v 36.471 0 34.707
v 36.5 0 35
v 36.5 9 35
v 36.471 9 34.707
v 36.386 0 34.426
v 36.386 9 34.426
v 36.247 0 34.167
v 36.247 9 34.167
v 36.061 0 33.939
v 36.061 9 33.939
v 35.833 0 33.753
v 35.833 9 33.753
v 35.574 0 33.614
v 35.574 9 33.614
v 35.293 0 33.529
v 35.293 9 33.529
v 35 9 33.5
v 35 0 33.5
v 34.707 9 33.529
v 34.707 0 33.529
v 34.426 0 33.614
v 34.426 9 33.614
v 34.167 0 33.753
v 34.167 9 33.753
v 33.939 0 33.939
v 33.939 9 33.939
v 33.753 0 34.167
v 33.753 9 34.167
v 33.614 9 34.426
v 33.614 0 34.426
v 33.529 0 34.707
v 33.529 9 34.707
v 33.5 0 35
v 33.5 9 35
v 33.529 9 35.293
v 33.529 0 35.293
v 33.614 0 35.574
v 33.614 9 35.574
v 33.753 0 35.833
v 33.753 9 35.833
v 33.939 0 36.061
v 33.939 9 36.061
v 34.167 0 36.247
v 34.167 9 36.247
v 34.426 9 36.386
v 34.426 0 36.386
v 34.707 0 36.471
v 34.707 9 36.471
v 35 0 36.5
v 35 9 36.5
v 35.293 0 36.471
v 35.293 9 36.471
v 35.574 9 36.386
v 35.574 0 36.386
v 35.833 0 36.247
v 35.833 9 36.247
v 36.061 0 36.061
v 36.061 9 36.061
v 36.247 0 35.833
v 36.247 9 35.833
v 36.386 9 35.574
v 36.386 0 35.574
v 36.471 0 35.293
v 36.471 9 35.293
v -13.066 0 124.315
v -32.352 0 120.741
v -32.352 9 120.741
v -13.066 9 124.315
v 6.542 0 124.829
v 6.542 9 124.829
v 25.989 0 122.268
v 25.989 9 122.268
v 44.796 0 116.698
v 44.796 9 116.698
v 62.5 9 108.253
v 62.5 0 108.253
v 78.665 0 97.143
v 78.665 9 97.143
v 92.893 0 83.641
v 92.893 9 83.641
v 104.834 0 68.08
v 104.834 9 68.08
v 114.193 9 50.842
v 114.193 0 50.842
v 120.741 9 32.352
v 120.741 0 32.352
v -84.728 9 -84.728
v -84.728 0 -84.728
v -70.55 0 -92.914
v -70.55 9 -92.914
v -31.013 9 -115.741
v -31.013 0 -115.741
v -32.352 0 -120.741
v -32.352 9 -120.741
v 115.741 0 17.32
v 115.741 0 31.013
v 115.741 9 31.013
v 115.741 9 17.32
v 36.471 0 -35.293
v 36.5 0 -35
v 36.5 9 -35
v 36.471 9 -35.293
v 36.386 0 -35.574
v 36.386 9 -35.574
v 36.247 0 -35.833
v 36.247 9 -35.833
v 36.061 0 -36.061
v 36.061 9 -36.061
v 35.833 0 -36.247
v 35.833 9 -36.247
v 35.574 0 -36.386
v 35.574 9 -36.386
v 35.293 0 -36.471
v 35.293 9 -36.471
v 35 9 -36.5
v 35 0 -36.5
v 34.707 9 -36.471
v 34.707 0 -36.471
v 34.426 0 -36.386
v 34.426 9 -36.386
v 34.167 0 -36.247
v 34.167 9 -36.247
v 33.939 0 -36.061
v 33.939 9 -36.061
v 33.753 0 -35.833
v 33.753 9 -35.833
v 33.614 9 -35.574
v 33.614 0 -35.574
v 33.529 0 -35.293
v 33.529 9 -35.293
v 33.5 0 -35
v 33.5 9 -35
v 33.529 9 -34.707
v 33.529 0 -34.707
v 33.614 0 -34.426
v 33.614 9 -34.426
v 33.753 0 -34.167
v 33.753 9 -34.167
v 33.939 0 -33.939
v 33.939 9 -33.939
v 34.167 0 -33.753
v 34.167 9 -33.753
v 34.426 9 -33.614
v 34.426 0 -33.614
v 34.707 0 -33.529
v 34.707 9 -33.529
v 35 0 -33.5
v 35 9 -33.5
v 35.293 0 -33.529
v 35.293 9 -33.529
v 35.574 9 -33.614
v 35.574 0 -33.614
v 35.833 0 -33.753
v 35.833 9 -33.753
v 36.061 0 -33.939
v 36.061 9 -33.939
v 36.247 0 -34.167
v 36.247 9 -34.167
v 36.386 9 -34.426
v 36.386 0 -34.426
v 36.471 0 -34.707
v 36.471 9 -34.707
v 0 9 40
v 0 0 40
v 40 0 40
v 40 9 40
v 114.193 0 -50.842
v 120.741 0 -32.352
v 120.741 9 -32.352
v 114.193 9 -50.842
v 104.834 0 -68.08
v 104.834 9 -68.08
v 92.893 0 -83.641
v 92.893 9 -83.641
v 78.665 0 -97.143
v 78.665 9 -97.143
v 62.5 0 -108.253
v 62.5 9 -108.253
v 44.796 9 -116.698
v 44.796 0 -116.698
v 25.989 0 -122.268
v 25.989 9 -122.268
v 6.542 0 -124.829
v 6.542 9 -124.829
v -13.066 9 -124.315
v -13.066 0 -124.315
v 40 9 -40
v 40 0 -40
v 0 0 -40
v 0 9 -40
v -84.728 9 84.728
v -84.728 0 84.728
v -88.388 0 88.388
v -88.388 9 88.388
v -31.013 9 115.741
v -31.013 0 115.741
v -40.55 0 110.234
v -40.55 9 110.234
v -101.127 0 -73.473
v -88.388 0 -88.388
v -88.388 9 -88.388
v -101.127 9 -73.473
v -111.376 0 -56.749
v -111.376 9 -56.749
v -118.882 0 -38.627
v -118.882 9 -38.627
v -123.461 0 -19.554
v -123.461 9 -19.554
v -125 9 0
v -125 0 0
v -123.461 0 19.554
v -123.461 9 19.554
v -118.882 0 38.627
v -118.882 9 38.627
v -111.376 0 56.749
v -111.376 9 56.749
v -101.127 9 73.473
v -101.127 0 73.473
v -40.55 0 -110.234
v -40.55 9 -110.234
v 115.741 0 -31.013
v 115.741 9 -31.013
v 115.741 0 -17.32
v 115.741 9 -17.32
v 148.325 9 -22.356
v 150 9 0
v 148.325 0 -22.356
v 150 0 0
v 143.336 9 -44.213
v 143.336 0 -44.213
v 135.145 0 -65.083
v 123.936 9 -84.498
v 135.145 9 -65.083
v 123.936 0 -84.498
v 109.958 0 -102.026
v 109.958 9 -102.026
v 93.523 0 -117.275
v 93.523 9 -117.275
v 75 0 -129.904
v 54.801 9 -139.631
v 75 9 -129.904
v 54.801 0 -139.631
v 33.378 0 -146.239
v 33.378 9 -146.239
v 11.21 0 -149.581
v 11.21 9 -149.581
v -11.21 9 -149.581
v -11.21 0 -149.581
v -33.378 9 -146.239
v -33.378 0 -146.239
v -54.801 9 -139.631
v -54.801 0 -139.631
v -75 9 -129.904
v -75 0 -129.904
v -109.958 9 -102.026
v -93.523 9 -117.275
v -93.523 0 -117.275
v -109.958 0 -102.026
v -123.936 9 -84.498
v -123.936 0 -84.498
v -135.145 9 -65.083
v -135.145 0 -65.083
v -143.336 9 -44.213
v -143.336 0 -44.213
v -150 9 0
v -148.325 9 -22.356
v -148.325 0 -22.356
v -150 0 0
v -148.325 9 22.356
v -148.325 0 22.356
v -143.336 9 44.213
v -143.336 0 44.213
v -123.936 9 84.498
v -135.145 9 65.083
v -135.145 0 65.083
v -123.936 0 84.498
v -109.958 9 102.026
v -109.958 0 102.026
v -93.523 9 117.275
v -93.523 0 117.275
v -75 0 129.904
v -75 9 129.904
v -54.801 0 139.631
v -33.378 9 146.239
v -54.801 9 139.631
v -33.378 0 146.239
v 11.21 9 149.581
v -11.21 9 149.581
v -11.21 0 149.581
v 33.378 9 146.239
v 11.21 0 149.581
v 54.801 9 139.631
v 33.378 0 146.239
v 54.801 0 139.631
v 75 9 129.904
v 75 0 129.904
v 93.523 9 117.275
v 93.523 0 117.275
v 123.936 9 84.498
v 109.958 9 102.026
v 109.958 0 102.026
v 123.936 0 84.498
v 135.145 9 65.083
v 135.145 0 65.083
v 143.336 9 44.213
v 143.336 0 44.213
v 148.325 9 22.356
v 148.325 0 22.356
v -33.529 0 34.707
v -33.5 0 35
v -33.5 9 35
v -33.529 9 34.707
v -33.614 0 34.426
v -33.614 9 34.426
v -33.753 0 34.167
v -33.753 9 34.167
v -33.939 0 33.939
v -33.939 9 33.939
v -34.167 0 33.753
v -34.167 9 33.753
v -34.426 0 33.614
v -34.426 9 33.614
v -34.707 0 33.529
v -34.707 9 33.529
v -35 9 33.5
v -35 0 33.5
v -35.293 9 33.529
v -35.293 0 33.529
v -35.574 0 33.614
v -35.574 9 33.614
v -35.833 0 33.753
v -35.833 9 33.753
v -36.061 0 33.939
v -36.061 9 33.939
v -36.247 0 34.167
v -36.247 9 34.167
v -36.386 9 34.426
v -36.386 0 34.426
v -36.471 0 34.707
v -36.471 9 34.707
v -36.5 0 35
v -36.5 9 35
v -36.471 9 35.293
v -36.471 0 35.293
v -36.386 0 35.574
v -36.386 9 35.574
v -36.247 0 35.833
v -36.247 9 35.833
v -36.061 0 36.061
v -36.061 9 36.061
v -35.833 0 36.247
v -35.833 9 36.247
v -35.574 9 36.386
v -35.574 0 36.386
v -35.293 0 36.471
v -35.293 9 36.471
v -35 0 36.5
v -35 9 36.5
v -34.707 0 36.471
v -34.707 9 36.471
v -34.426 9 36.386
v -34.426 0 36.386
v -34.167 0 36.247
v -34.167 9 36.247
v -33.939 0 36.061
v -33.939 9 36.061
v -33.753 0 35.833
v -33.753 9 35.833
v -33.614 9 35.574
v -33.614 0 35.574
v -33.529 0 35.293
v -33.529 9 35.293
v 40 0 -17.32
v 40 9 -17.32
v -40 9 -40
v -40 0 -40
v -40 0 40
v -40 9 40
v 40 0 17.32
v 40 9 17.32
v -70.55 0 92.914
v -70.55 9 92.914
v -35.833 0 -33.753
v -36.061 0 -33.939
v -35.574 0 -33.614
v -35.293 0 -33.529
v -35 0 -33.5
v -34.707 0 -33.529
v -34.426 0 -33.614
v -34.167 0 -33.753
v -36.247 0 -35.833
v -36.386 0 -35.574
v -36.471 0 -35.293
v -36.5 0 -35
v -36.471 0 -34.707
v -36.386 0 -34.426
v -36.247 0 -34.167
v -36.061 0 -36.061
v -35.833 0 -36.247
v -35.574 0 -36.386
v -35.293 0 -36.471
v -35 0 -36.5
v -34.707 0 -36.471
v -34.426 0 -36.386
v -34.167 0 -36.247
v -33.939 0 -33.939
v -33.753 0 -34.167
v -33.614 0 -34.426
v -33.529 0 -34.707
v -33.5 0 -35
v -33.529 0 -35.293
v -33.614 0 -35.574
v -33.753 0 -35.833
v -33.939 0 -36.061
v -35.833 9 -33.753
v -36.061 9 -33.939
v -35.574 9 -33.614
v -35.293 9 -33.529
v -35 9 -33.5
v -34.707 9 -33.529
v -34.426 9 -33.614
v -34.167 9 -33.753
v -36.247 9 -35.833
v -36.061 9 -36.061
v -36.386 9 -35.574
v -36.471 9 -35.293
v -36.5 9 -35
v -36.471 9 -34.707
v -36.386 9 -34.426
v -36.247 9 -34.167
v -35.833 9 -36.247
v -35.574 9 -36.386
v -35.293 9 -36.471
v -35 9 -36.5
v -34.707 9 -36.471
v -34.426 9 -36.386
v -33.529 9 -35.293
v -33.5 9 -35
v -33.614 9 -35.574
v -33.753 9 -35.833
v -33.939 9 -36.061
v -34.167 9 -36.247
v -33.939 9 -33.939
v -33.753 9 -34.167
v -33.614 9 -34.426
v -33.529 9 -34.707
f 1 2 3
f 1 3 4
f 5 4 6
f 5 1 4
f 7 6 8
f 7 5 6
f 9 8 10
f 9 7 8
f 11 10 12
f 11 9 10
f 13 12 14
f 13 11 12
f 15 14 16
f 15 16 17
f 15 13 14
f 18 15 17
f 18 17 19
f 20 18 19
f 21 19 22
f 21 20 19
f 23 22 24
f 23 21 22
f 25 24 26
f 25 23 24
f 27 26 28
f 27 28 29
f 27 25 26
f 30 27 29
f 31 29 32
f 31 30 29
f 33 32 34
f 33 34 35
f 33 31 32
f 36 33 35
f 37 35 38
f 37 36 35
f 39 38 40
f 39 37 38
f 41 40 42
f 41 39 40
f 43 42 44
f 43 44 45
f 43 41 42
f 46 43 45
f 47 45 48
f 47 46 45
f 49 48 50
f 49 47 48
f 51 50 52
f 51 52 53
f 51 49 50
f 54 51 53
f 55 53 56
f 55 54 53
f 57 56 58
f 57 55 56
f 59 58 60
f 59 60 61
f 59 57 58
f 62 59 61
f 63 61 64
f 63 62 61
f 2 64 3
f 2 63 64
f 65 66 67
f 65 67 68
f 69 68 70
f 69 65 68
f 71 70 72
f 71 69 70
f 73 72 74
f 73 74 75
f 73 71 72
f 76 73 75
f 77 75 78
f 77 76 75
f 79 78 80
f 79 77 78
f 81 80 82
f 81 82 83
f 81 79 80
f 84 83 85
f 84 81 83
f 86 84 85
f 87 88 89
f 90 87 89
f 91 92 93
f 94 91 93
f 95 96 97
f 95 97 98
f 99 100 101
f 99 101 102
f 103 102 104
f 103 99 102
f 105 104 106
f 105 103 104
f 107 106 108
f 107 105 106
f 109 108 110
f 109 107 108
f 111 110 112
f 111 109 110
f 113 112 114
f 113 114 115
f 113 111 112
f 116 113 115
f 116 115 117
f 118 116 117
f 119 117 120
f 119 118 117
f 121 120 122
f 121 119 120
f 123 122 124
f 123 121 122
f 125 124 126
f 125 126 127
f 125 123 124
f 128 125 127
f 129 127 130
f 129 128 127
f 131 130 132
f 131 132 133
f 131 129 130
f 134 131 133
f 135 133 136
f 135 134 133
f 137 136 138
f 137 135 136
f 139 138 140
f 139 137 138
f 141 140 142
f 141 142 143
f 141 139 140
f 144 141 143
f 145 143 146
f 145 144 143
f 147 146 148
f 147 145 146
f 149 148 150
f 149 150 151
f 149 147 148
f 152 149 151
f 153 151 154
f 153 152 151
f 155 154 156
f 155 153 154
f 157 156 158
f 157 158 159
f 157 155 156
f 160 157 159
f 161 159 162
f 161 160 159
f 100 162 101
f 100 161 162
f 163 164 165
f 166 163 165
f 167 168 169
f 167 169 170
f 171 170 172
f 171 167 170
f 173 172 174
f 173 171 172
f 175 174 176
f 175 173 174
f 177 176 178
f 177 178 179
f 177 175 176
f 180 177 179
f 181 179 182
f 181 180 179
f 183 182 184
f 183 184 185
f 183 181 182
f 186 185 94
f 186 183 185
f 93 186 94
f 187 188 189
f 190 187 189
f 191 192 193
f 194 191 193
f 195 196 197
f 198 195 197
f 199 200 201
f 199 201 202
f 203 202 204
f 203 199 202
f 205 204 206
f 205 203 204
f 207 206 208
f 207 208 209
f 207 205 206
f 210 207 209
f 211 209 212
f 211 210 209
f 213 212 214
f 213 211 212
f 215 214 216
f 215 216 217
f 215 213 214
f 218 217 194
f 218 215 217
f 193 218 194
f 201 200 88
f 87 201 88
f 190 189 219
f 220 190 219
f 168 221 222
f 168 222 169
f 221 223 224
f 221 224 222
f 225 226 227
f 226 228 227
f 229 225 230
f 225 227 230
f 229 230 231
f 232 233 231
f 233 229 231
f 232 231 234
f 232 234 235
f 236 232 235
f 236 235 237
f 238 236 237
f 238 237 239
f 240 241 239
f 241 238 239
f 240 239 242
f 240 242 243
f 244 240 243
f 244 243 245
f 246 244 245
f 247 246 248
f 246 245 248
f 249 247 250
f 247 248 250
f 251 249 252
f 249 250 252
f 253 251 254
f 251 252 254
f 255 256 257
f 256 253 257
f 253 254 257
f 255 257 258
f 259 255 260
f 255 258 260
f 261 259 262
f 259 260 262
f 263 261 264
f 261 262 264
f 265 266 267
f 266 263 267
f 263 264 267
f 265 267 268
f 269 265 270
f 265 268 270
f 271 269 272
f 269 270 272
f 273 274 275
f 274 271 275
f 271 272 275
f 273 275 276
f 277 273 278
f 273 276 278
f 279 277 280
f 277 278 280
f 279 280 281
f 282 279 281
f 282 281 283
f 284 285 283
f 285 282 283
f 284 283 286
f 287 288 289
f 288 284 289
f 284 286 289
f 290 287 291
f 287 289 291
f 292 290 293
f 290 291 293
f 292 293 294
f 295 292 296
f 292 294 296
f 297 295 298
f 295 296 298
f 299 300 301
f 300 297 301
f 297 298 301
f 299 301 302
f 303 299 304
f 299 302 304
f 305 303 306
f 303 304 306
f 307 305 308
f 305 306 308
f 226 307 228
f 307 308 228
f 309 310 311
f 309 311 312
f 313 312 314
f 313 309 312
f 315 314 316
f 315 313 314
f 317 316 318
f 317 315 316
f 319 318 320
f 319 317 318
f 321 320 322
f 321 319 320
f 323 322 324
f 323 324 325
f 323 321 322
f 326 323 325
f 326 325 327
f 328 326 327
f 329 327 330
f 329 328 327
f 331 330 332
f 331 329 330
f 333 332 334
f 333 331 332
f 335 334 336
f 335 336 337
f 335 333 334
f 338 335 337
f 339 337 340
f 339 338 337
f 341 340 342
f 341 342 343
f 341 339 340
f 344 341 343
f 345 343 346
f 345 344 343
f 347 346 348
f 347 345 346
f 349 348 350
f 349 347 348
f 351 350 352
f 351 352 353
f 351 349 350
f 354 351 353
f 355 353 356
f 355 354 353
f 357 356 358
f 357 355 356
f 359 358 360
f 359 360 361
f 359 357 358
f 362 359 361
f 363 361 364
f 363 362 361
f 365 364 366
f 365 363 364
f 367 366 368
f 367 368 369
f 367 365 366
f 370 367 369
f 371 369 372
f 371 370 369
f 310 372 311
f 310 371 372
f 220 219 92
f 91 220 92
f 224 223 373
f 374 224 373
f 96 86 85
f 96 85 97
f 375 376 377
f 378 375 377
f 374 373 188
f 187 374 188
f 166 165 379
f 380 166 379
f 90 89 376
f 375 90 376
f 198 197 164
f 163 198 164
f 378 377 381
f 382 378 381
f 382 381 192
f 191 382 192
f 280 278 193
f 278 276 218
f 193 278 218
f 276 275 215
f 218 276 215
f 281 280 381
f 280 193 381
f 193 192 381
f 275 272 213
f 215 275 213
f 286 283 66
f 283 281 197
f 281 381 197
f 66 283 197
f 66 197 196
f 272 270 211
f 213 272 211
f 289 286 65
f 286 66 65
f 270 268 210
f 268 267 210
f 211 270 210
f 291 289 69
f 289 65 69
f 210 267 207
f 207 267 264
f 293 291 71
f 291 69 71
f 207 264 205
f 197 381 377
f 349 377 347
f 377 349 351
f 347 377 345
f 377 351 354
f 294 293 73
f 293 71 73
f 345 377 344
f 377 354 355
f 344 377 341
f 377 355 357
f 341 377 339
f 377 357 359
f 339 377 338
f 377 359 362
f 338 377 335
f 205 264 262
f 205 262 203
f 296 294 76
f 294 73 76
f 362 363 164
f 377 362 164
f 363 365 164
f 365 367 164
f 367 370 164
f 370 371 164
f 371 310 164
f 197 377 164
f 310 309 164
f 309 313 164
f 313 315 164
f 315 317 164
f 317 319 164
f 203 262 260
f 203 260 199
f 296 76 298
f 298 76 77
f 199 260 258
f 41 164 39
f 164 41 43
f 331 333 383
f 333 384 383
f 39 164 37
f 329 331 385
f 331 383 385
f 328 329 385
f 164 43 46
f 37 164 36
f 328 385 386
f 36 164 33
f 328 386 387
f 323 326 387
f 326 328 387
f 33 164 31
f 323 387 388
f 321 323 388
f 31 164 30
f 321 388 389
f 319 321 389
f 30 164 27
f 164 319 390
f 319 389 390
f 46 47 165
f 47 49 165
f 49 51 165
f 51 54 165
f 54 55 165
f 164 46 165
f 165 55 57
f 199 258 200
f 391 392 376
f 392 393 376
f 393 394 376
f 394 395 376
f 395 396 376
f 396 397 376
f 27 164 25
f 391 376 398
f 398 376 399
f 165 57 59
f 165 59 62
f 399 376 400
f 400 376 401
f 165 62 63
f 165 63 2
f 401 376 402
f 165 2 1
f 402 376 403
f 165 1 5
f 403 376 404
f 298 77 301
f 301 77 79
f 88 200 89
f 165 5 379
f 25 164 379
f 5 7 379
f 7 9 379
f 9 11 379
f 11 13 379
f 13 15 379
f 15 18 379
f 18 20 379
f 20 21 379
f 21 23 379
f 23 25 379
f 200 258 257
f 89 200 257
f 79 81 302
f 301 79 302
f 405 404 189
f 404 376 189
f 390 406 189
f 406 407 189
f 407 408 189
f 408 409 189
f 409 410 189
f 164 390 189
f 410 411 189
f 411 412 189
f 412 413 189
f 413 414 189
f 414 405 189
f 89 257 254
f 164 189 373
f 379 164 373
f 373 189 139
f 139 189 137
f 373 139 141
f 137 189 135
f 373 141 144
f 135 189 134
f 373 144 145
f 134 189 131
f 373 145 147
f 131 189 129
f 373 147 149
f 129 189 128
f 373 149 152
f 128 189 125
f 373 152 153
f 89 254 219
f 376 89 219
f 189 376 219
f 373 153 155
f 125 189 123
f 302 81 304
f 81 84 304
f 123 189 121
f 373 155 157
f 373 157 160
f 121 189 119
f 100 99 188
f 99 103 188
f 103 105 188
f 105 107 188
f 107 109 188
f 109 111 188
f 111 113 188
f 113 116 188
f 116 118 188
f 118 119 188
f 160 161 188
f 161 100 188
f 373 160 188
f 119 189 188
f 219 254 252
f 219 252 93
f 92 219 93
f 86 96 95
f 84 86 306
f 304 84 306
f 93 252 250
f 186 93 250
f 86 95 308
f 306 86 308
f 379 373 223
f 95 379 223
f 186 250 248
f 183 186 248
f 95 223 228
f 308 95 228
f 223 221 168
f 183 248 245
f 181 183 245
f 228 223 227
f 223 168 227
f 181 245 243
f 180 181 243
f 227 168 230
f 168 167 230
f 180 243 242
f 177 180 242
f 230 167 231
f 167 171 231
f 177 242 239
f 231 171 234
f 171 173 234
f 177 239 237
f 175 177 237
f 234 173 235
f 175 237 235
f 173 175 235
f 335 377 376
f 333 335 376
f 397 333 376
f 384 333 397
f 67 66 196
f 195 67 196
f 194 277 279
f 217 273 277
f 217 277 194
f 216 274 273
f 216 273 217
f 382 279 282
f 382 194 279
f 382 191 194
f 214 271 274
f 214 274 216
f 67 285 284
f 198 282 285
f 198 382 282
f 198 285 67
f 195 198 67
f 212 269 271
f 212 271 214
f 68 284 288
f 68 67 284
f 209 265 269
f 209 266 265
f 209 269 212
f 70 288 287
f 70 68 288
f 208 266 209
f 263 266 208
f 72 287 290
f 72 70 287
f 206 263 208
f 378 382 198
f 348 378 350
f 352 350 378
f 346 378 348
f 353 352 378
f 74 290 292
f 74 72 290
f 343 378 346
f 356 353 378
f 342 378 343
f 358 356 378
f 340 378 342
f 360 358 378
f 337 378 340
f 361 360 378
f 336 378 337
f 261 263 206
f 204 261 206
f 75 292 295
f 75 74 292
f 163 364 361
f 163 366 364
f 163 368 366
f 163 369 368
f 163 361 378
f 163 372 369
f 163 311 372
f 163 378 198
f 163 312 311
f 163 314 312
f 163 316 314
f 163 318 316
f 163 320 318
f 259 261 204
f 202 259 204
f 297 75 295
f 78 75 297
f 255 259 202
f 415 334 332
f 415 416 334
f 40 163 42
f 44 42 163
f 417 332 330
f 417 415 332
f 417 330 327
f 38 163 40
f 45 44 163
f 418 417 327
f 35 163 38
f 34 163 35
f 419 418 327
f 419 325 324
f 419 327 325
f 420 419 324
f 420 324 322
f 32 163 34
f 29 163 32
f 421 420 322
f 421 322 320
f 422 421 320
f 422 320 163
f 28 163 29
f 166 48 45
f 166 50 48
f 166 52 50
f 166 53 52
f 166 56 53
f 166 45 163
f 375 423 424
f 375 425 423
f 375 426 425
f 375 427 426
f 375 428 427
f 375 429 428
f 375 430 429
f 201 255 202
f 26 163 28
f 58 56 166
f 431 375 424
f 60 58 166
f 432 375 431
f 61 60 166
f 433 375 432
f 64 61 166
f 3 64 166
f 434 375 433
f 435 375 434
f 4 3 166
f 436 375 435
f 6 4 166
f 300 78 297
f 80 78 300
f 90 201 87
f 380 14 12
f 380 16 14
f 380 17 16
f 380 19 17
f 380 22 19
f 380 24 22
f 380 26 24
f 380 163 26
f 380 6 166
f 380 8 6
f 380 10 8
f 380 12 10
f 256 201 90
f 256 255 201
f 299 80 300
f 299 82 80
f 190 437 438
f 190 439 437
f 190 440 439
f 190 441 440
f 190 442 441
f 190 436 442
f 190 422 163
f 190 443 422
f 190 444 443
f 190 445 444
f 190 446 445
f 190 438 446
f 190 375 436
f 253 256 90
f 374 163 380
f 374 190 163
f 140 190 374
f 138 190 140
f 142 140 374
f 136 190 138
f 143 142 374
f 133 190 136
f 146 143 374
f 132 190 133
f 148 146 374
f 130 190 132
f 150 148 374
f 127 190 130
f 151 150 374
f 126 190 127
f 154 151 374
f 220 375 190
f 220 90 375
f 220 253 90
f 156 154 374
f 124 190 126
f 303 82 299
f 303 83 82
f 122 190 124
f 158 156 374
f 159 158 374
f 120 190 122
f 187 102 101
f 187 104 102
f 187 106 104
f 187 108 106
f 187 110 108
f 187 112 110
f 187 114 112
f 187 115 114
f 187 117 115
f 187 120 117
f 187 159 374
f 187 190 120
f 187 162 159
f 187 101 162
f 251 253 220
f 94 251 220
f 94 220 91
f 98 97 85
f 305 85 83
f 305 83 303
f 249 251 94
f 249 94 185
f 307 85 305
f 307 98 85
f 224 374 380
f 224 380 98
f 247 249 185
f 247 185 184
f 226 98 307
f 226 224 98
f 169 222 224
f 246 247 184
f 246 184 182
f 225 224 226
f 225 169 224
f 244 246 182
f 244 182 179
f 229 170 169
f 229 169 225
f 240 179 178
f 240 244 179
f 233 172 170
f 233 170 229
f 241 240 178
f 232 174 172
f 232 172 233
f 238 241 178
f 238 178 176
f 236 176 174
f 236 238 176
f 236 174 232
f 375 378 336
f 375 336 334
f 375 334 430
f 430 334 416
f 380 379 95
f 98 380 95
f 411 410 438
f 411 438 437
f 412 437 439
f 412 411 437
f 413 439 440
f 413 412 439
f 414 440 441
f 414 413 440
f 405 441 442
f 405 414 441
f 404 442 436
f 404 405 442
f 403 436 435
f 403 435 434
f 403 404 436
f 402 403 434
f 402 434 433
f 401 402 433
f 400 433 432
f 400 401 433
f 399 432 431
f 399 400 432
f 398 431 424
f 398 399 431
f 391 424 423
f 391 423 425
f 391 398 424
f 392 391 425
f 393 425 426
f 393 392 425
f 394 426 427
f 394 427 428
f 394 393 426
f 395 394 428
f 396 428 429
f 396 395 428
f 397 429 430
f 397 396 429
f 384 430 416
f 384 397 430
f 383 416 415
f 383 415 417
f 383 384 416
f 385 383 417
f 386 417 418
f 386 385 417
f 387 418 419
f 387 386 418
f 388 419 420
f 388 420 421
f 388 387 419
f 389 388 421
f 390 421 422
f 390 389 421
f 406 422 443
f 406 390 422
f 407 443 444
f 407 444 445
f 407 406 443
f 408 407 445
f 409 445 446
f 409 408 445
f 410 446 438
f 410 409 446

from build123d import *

# Parameters (mm, degrees)
CROQUIS1_R              = 150
CROQUIS1_R_2            = 125
SALIENTE_EXTRUIR1_DEPTH = 9
SALIENTE_EXTRUIR3_DEPTH = 9
CROQUIS3_R              = 1.5
SALIENTE_EXTRUIR4_DEPTH = 9


with BuildPart() as part:
    # Croquis1 → Saliente-Extruir1 (new body)
    with BuildSketch(Plane(origin=(0, 0, 0), x_dir=(1, 0, 0), z_dir=(0, 1, 0))):
        Circle(CROQUIS1_R)
        Circle(CROQUIS1_R_2, mode=Mode.SUBTRACT)
    extrude(amount=SALIENTE_EXTRUIR1_DEPTH)

    # Croquis2 → Saliente-Extruir3 (add)
    with BuildSketch(Plane(origin=(0, 0, 0), x_dir=(1, 0, 0), z_dir=(0, 1, 0))):
        Polygon((120.740728286, 32.352380638), (146.469530849, 32.352380638), (146.469530849, -32.352380638), (120.740728286, -32.352380638), (115.740728286, -31.012634676), (115.740728286, 31.012634676), align=None)
        Polygon((-88.388347648, -88.388347648), (-101.25274893, -110.670144277), (-45.216781919, -143.022524914), (-32.352380638, -120.740728286), (-31.012634676, -115.740728286), (-84.72809361, -84.72809361), align=None)
        Polygon((-32.352380638, 120.740728286), (-45.216781919, 143.022524914), (-101.25274893, 110.670144277), (-88.388347648, 88.388347648), (-84.72809361, 84.72809361), (-31.012634676, 115.740728286), align=None)
    extrude(amount=SALIENTE_EXTRUIR3_DEPTH)

    # Croquis3 → Saliente-Extruir4 (add)
    with BuildSketch(Plane(origin=(0, 0, 0), x_dir=(1, 0, 0), z_dir=(0, 1, 0))):
        Polygon((-70.549856067, 92.913902873), (-40, 40), (-40, -40), (-70.549856067, -92.913902873), (-40.549856067, -110.234410948), (0, -40), (40, -40), (40, -17.32), (115.740728286, -17.32), (115.740728286, 17.32), (40, 17.32), (40, 40), (0, 40), (-40.549856067, 110.234410948), align=None)
        with Locations((-35, 35)):
            Circle(CROQUIS3_R, mode=Mode.SUBTRACT)
        with Locations((35, 35)):
            Circle(CROQUIS3_R, mode=Mode.SUBTRACT)
        with Locations((35, -35)):
            Circle(CROQUIS3_R, mode=Mode.SUBTRACT)
        with Locations((-35, -35)):
            Circle(CROQUIS3_R, mode=Mode.SUBTRACT)
    extrude(amount=SALIENTE_EXTRUIR4_DEPTH)


solid = part.part
